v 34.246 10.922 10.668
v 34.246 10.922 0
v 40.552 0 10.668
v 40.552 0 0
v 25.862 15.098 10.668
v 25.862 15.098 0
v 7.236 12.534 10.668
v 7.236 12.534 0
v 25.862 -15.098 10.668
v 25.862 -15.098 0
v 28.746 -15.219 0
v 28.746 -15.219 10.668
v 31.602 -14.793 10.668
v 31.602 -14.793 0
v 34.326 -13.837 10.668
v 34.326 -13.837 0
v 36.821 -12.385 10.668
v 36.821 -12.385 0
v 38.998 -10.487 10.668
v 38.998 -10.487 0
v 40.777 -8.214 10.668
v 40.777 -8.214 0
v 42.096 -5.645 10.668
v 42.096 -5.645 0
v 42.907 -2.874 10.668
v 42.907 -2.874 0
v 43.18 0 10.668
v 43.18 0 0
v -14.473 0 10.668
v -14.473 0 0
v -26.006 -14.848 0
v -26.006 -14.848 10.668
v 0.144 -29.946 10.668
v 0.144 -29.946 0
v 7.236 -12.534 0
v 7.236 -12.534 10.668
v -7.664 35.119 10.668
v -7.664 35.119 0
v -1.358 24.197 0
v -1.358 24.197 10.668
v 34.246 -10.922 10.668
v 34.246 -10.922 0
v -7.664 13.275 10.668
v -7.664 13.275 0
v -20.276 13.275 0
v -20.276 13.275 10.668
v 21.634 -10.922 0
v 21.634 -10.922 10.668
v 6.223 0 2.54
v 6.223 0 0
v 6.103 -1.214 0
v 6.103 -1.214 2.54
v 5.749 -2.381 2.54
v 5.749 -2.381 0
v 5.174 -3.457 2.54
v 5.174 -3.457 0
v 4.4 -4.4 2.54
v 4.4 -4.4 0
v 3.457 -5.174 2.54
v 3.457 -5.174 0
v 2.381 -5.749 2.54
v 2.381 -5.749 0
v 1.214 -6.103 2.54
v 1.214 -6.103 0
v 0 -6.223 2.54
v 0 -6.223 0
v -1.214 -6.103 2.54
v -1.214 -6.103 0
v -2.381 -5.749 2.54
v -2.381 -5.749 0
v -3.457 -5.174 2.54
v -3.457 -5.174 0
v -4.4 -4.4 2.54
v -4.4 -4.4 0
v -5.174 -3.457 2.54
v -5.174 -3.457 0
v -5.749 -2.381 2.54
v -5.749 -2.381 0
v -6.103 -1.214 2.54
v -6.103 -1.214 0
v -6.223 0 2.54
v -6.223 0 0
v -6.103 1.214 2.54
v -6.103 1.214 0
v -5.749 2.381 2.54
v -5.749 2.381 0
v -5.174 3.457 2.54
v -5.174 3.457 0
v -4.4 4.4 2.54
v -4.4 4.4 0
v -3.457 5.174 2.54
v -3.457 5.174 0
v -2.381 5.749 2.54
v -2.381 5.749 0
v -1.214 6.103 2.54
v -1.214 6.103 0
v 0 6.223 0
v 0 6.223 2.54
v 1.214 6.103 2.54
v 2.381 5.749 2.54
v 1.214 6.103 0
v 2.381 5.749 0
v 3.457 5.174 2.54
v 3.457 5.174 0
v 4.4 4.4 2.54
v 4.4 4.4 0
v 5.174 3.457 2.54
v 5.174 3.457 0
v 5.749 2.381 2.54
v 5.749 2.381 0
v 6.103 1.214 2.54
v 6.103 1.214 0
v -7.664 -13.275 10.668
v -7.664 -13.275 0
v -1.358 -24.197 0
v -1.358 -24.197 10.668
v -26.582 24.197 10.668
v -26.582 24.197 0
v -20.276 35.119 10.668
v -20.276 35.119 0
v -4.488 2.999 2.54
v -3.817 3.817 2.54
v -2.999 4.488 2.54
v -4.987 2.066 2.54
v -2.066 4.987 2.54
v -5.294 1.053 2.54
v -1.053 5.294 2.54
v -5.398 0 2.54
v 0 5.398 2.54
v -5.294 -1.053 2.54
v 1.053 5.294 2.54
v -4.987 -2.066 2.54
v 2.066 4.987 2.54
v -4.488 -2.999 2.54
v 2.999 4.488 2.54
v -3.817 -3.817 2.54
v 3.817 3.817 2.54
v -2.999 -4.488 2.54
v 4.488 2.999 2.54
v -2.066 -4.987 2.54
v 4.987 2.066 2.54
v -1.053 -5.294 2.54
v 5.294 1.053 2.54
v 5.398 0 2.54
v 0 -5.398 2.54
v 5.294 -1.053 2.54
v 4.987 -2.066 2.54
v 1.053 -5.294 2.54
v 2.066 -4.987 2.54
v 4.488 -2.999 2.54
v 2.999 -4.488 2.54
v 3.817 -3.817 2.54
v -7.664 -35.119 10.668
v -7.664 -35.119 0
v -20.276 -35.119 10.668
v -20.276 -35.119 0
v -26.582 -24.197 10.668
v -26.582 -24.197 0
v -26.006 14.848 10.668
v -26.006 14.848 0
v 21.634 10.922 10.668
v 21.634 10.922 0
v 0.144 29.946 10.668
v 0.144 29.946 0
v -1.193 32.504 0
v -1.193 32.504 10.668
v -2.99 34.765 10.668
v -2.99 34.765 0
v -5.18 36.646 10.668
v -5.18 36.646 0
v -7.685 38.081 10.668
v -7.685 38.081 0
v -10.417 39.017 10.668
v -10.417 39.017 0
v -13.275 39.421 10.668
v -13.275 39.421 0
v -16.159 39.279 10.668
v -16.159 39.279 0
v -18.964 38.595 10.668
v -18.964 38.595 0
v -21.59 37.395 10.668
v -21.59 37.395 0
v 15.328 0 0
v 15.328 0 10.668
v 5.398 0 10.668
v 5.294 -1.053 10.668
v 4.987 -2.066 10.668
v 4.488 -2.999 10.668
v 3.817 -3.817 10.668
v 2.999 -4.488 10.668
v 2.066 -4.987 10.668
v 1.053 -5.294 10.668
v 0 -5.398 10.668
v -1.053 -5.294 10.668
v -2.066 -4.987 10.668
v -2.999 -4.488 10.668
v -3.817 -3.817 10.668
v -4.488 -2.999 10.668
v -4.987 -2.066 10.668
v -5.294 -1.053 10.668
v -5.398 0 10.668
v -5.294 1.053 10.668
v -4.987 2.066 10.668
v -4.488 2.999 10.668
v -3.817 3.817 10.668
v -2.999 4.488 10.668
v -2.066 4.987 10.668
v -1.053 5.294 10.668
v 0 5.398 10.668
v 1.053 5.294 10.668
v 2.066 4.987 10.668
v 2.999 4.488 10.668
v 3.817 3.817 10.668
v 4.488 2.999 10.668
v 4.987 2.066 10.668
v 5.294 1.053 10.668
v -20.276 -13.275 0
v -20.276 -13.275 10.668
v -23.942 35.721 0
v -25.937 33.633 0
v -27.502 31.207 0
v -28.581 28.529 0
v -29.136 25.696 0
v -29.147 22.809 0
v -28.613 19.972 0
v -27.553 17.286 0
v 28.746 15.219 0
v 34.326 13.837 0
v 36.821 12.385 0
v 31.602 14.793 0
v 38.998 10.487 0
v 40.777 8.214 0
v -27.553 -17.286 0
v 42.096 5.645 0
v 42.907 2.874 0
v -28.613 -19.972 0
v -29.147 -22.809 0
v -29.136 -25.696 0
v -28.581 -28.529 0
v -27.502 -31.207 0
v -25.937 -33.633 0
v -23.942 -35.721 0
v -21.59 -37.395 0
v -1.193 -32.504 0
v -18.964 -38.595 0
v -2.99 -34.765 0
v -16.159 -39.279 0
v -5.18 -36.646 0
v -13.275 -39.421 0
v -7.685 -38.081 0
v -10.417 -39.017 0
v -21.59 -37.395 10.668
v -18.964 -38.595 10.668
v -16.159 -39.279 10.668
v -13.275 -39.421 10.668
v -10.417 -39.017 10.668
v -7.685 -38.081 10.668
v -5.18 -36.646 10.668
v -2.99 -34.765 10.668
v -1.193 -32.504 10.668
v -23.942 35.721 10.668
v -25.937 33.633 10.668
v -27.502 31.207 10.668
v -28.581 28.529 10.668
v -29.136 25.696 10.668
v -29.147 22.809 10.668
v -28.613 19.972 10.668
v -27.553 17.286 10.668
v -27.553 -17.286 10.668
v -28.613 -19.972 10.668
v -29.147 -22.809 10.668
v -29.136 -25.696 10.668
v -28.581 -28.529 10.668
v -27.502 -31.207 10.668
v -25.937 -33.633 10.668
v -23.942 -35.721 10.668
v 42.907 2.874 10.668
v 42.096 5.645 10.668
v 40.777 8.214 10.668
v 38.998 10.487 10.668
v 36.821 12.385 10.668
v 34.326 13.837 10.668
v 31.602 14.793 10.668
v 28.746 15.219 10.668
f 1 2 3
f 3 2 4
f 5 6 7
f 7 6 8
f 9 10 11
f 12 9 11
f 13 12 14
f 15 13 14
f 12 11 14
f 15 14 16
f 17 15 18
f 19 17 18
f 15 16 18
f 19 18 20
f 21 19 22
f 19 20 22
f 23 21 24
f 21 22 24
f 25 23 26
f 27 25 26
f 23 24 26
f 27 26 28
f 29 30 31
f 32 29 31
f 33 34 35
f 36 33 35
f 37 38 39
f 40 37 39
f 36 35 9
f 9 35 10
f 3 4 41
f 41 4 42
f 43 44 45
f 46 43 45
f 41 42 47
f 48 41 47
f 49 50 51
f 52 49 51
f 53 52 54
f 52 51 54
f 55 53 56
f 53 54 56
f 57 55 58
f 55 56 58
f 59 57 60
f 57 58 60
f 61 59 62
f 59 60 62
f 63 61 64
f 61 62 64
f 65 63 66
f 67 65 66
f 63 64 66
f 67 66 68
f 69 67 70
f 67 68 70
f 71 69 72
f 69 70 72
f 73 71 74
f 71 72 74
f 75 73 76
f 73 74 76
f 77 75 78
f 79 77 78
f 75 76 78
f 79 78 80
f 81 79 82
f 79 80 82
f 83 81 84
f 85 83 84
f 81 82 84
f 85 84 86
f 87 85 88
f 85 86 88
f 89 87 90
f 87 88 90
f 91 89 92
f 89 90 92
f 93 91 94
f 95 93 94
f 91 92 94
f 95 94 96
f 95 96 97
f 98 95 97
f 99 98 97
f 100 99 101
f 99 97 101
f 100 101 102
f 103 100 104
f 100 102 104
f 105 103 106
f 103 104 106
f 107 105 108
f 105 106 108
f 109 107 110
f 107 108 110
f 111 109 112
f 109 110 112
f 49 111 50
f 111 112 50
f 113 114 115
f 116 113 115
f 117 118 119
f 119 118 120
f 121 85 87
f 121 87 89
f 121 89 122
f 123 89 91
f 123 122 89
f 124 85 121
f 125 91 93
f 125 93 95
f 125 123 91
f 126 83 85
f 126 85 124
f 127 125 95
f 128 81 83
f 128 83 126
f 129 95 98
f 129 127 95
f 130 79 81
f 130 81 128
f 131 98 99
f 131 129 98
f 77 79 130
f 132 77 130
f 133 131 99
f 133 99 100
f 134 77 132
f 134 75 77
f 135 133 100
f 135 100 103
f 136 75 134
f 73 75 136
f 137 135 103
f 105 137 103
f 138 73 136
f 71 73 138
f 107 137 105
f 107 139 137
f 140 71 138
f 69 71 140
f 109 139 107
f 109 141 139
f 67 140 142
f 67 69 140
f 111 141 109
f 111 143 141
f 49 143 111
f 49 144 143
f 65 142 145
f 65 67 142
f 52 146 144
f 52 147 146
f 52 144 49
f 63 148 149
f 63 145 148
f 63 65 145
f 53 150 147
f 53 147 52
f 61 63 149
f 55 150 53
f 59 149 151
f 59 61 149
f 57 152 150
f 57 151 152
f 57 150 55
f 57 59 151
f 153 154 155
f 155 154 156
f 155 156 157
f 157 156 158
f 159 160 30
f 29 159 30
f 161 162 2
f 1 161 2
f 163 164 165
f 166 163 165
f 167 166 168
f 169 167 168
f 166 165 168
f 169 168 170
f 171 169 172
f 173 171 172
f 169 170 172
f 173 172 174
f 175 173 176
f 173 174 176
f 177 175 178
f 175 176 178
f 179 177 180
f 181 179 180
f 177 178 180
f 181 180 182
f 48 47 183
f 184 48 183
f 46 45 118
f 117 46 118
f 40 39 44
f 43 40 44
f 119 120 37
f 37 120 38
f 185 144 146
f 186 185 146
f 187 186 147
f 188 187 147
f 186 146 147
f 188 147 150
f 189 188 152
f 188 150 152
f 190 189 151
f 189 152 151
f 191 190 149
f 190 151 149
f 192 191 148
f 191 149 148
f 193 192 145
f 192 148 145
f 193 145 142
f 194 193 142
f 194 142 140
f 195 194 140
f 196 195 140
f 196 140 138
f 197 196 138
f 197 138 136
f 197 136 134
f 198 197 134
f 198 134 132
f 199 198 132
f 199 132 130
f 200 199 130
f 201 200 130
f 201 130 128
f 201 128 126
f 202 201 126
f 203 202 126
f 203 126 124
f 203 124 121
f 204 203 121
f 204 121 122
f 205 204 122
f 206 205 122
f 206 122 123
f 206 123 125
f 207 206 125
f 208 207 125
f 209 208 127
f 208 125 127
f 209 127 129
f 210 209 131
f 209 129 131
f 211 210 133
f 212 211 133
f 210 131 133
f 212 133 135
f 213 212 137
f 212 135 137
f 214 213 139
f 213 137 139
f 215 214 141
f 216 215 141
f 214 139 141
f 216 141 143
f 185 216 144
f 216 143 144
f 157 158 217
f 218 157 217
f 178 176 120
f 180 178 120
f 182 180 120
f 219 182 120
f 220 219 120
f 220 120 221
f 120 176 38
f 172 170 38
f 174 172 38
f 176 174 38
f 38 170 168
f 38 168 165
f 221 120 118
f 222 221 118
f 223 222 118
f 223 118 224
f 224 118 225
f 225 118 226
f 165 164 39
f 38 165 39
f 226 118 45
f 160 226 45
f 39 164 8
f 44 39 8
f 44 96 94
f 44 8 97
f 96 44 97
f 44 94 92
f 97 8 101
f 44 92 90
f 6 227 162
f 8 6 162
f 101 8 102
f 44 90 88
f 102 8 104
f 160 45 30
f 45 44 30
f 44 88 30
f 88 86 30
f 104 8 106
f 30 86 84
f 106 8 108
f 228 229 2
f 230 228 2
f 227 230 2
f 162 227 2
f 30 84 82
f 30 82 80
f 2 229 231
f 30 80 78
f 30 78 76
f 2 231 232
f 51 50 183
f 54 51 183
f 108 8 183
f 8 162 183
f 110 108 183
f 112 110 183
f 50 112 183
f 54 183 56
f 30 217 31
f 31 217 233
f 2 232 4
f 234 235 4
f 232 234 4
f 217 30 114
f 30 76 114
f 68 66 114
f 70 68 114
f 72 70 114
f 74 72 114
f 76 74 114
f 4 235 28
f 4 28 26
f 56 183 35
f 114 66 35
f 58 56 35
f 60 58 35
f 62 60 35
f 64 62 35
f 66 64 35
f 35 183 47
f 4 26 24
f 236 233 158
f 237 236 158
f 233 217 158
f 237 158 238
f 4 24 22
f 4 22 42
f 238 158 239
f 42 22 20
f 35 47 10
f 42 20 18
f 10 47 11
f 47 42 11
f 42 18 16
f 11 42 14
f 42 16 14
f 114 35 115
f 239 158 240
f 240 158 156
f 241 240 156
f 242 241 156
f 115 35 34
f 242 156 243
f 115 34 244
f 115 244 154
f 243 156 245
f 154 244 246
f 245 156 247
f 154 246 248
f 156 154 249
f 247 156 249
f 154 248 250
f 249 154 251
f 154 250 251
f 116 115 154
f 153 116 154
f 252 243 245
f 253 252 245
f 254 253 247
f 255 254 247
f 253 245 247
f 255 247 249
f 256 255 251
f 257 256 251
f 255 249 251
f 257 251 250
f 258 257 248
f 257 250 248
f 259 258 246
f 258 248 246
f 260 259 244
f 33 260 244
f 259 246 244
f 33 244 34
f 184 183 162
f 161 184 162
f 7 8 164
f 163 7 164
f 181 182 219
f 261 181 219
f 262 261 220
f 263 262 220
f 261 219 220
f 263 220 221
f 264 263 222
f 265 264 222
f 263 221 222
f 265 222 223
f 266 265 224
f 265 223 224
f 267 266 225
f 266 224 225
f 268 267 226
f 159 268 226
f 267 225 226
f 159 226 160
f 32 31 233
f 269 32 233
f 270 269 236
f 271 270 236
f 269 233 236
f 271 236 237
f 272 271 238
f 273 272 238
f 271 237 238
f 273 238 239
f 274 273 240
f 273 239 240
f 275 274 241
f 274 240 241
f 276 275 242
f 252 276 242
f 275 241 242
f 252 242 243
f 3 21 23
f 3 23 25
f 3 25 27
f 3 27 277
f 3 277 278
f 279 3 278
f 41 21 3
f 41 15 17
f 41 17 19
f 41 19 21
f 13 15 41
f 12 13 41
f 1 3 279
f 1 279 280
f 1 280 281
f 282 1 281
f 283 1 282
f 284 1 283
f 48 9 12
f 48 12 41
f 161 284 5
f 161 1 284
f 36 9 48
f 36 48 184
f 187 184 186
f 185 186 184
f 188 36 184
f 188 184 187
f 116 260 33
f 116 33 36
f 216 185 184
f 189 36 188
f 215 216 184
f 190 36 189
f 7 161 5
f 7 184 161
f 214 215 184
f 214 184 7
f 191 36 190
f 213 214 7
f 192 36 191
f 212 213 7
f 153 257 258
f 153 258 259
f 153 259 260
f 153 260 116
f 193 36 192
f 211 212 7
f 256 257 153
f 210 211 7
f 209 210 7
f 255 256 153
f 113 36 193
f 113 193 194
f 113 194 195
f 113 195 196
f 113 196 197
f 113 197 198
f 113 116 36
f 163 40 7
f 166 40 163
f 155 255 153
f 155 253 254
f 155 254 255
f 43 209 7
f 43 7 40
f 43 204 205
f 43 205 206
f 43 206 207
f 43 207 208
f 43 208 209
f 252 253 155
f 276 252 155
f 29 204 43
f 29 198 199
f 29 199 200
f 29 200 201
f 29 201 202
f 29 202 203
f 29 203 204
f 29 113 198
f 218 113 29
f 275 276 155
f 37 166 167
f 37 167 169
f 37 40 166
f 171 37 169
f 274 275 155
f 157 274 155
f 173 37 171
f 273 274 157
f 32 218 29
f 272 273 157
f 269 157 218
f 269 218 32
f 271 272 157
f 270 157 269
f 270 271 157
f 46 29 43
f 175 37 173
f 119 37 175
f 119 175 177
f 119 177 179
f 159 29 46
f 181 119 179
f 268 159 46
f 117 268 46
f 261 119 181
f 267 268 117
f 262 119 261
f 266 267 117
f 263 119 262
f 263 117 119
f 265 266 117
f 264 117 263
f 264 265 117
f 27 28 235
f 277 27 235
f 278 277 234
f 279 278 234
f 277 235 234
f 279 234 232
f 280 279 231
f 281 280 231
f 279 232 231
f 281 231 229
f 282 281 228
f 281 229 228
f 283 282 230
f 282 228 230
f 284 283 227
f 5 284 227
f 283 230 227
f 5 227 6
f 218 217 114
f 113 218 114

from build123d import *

# Parameters (mm, degrees)
F1_DEPTH = 10.668
F3_COUNT = 3
F4_R     = 6.223
F5_DEPTH = 2.54
F6_R     = 5.3975
F7_DEPTH = 25.4


with BuildPart() as f1:
    # F0 (on Top) → F1 (new body)
    with BuildSketch(Plane.XY):
        with BuildLine():
            ThreePointArc((-1.558636, 11.323231), (7.510982, 8.615687), (11.43, 0))
            ThreePointArc((11.43, 0), (7.510982, -8.615687), (-1.558636, -11.323231))
            Line((-1.558636, -11.323231), (25.861818, -15.097641))
            ThreePointArc((25.861818, -15.097641), (12.7, 0), (25.861818, 15.097641))
            Line((25.861818, 15.097641), (-1.558636, 11.323231))
        make_face()
        with BuildLine():
            ThreePointArc((-1.558636, -11.323231), (7.510982, -8.615687), (11.43, 0))
            ThreePointArc((11.43, 0), (7.510982, 8.615687), (-1.558636, 11.323231))
            ThreePointArc((-1.558636, 11.323231), (-11.43, 0), (-1.558636, -11.323231))
        make_face()
        with BuildLine():
            ThreePointArc((43.18, 0), (37.954642, 11.487582), (25.861818, 15.097641))
            ThreePointArc((25.861818, 15.097641), (12.7, 0), (25.861818, -15.097641))
            ThreePointArc((25.861818, -15.097641), (37.954642, -11.487582), (43.18, 0))
        make_face()
        Polygon((40.551639, 0), (34.24582, -10.922), (21.63418, -10.922), (15.328361, 0), (21.63418, 10.922), (34.24582, 10.922), align=None, mode=Mode.SUBTRACT)
    extrude(amount=F1_DEPTH)

    # F3: F1 ×3 about axis
    f3_axis = Axis((0, 0, 10.668), (0, 0, -1))


with BuildPart() as f1_1:
    add(f1.part)
    for i in range(1, F3_COUNT):
        add(f1.part.rotate(f3_axis, i * 360 / F3_COUNT))

    # F4 (on face) → F5 (cut)
    with BuildSketch(Plane(origin=(0, 0, 0), x_dir=(1, 0, 0), z_dir=(0, 0, -1))):
        Circle(F4_R)
    extrude(amount=-F5_DEPTH, mode=Mode.SUBTRACT)

    # F6 (on face) → F7 (cut)
    with BuildSketch(Plane(origin=(0, 0, 2.54), x_dir=(1, 0, 0), z_dir=(0, 0, -1))):
        Circle(F6_R)
    extrude(amount=-F7_DEPTH, mode=Mode.SUBTRACT)


solid = f1_1.part
